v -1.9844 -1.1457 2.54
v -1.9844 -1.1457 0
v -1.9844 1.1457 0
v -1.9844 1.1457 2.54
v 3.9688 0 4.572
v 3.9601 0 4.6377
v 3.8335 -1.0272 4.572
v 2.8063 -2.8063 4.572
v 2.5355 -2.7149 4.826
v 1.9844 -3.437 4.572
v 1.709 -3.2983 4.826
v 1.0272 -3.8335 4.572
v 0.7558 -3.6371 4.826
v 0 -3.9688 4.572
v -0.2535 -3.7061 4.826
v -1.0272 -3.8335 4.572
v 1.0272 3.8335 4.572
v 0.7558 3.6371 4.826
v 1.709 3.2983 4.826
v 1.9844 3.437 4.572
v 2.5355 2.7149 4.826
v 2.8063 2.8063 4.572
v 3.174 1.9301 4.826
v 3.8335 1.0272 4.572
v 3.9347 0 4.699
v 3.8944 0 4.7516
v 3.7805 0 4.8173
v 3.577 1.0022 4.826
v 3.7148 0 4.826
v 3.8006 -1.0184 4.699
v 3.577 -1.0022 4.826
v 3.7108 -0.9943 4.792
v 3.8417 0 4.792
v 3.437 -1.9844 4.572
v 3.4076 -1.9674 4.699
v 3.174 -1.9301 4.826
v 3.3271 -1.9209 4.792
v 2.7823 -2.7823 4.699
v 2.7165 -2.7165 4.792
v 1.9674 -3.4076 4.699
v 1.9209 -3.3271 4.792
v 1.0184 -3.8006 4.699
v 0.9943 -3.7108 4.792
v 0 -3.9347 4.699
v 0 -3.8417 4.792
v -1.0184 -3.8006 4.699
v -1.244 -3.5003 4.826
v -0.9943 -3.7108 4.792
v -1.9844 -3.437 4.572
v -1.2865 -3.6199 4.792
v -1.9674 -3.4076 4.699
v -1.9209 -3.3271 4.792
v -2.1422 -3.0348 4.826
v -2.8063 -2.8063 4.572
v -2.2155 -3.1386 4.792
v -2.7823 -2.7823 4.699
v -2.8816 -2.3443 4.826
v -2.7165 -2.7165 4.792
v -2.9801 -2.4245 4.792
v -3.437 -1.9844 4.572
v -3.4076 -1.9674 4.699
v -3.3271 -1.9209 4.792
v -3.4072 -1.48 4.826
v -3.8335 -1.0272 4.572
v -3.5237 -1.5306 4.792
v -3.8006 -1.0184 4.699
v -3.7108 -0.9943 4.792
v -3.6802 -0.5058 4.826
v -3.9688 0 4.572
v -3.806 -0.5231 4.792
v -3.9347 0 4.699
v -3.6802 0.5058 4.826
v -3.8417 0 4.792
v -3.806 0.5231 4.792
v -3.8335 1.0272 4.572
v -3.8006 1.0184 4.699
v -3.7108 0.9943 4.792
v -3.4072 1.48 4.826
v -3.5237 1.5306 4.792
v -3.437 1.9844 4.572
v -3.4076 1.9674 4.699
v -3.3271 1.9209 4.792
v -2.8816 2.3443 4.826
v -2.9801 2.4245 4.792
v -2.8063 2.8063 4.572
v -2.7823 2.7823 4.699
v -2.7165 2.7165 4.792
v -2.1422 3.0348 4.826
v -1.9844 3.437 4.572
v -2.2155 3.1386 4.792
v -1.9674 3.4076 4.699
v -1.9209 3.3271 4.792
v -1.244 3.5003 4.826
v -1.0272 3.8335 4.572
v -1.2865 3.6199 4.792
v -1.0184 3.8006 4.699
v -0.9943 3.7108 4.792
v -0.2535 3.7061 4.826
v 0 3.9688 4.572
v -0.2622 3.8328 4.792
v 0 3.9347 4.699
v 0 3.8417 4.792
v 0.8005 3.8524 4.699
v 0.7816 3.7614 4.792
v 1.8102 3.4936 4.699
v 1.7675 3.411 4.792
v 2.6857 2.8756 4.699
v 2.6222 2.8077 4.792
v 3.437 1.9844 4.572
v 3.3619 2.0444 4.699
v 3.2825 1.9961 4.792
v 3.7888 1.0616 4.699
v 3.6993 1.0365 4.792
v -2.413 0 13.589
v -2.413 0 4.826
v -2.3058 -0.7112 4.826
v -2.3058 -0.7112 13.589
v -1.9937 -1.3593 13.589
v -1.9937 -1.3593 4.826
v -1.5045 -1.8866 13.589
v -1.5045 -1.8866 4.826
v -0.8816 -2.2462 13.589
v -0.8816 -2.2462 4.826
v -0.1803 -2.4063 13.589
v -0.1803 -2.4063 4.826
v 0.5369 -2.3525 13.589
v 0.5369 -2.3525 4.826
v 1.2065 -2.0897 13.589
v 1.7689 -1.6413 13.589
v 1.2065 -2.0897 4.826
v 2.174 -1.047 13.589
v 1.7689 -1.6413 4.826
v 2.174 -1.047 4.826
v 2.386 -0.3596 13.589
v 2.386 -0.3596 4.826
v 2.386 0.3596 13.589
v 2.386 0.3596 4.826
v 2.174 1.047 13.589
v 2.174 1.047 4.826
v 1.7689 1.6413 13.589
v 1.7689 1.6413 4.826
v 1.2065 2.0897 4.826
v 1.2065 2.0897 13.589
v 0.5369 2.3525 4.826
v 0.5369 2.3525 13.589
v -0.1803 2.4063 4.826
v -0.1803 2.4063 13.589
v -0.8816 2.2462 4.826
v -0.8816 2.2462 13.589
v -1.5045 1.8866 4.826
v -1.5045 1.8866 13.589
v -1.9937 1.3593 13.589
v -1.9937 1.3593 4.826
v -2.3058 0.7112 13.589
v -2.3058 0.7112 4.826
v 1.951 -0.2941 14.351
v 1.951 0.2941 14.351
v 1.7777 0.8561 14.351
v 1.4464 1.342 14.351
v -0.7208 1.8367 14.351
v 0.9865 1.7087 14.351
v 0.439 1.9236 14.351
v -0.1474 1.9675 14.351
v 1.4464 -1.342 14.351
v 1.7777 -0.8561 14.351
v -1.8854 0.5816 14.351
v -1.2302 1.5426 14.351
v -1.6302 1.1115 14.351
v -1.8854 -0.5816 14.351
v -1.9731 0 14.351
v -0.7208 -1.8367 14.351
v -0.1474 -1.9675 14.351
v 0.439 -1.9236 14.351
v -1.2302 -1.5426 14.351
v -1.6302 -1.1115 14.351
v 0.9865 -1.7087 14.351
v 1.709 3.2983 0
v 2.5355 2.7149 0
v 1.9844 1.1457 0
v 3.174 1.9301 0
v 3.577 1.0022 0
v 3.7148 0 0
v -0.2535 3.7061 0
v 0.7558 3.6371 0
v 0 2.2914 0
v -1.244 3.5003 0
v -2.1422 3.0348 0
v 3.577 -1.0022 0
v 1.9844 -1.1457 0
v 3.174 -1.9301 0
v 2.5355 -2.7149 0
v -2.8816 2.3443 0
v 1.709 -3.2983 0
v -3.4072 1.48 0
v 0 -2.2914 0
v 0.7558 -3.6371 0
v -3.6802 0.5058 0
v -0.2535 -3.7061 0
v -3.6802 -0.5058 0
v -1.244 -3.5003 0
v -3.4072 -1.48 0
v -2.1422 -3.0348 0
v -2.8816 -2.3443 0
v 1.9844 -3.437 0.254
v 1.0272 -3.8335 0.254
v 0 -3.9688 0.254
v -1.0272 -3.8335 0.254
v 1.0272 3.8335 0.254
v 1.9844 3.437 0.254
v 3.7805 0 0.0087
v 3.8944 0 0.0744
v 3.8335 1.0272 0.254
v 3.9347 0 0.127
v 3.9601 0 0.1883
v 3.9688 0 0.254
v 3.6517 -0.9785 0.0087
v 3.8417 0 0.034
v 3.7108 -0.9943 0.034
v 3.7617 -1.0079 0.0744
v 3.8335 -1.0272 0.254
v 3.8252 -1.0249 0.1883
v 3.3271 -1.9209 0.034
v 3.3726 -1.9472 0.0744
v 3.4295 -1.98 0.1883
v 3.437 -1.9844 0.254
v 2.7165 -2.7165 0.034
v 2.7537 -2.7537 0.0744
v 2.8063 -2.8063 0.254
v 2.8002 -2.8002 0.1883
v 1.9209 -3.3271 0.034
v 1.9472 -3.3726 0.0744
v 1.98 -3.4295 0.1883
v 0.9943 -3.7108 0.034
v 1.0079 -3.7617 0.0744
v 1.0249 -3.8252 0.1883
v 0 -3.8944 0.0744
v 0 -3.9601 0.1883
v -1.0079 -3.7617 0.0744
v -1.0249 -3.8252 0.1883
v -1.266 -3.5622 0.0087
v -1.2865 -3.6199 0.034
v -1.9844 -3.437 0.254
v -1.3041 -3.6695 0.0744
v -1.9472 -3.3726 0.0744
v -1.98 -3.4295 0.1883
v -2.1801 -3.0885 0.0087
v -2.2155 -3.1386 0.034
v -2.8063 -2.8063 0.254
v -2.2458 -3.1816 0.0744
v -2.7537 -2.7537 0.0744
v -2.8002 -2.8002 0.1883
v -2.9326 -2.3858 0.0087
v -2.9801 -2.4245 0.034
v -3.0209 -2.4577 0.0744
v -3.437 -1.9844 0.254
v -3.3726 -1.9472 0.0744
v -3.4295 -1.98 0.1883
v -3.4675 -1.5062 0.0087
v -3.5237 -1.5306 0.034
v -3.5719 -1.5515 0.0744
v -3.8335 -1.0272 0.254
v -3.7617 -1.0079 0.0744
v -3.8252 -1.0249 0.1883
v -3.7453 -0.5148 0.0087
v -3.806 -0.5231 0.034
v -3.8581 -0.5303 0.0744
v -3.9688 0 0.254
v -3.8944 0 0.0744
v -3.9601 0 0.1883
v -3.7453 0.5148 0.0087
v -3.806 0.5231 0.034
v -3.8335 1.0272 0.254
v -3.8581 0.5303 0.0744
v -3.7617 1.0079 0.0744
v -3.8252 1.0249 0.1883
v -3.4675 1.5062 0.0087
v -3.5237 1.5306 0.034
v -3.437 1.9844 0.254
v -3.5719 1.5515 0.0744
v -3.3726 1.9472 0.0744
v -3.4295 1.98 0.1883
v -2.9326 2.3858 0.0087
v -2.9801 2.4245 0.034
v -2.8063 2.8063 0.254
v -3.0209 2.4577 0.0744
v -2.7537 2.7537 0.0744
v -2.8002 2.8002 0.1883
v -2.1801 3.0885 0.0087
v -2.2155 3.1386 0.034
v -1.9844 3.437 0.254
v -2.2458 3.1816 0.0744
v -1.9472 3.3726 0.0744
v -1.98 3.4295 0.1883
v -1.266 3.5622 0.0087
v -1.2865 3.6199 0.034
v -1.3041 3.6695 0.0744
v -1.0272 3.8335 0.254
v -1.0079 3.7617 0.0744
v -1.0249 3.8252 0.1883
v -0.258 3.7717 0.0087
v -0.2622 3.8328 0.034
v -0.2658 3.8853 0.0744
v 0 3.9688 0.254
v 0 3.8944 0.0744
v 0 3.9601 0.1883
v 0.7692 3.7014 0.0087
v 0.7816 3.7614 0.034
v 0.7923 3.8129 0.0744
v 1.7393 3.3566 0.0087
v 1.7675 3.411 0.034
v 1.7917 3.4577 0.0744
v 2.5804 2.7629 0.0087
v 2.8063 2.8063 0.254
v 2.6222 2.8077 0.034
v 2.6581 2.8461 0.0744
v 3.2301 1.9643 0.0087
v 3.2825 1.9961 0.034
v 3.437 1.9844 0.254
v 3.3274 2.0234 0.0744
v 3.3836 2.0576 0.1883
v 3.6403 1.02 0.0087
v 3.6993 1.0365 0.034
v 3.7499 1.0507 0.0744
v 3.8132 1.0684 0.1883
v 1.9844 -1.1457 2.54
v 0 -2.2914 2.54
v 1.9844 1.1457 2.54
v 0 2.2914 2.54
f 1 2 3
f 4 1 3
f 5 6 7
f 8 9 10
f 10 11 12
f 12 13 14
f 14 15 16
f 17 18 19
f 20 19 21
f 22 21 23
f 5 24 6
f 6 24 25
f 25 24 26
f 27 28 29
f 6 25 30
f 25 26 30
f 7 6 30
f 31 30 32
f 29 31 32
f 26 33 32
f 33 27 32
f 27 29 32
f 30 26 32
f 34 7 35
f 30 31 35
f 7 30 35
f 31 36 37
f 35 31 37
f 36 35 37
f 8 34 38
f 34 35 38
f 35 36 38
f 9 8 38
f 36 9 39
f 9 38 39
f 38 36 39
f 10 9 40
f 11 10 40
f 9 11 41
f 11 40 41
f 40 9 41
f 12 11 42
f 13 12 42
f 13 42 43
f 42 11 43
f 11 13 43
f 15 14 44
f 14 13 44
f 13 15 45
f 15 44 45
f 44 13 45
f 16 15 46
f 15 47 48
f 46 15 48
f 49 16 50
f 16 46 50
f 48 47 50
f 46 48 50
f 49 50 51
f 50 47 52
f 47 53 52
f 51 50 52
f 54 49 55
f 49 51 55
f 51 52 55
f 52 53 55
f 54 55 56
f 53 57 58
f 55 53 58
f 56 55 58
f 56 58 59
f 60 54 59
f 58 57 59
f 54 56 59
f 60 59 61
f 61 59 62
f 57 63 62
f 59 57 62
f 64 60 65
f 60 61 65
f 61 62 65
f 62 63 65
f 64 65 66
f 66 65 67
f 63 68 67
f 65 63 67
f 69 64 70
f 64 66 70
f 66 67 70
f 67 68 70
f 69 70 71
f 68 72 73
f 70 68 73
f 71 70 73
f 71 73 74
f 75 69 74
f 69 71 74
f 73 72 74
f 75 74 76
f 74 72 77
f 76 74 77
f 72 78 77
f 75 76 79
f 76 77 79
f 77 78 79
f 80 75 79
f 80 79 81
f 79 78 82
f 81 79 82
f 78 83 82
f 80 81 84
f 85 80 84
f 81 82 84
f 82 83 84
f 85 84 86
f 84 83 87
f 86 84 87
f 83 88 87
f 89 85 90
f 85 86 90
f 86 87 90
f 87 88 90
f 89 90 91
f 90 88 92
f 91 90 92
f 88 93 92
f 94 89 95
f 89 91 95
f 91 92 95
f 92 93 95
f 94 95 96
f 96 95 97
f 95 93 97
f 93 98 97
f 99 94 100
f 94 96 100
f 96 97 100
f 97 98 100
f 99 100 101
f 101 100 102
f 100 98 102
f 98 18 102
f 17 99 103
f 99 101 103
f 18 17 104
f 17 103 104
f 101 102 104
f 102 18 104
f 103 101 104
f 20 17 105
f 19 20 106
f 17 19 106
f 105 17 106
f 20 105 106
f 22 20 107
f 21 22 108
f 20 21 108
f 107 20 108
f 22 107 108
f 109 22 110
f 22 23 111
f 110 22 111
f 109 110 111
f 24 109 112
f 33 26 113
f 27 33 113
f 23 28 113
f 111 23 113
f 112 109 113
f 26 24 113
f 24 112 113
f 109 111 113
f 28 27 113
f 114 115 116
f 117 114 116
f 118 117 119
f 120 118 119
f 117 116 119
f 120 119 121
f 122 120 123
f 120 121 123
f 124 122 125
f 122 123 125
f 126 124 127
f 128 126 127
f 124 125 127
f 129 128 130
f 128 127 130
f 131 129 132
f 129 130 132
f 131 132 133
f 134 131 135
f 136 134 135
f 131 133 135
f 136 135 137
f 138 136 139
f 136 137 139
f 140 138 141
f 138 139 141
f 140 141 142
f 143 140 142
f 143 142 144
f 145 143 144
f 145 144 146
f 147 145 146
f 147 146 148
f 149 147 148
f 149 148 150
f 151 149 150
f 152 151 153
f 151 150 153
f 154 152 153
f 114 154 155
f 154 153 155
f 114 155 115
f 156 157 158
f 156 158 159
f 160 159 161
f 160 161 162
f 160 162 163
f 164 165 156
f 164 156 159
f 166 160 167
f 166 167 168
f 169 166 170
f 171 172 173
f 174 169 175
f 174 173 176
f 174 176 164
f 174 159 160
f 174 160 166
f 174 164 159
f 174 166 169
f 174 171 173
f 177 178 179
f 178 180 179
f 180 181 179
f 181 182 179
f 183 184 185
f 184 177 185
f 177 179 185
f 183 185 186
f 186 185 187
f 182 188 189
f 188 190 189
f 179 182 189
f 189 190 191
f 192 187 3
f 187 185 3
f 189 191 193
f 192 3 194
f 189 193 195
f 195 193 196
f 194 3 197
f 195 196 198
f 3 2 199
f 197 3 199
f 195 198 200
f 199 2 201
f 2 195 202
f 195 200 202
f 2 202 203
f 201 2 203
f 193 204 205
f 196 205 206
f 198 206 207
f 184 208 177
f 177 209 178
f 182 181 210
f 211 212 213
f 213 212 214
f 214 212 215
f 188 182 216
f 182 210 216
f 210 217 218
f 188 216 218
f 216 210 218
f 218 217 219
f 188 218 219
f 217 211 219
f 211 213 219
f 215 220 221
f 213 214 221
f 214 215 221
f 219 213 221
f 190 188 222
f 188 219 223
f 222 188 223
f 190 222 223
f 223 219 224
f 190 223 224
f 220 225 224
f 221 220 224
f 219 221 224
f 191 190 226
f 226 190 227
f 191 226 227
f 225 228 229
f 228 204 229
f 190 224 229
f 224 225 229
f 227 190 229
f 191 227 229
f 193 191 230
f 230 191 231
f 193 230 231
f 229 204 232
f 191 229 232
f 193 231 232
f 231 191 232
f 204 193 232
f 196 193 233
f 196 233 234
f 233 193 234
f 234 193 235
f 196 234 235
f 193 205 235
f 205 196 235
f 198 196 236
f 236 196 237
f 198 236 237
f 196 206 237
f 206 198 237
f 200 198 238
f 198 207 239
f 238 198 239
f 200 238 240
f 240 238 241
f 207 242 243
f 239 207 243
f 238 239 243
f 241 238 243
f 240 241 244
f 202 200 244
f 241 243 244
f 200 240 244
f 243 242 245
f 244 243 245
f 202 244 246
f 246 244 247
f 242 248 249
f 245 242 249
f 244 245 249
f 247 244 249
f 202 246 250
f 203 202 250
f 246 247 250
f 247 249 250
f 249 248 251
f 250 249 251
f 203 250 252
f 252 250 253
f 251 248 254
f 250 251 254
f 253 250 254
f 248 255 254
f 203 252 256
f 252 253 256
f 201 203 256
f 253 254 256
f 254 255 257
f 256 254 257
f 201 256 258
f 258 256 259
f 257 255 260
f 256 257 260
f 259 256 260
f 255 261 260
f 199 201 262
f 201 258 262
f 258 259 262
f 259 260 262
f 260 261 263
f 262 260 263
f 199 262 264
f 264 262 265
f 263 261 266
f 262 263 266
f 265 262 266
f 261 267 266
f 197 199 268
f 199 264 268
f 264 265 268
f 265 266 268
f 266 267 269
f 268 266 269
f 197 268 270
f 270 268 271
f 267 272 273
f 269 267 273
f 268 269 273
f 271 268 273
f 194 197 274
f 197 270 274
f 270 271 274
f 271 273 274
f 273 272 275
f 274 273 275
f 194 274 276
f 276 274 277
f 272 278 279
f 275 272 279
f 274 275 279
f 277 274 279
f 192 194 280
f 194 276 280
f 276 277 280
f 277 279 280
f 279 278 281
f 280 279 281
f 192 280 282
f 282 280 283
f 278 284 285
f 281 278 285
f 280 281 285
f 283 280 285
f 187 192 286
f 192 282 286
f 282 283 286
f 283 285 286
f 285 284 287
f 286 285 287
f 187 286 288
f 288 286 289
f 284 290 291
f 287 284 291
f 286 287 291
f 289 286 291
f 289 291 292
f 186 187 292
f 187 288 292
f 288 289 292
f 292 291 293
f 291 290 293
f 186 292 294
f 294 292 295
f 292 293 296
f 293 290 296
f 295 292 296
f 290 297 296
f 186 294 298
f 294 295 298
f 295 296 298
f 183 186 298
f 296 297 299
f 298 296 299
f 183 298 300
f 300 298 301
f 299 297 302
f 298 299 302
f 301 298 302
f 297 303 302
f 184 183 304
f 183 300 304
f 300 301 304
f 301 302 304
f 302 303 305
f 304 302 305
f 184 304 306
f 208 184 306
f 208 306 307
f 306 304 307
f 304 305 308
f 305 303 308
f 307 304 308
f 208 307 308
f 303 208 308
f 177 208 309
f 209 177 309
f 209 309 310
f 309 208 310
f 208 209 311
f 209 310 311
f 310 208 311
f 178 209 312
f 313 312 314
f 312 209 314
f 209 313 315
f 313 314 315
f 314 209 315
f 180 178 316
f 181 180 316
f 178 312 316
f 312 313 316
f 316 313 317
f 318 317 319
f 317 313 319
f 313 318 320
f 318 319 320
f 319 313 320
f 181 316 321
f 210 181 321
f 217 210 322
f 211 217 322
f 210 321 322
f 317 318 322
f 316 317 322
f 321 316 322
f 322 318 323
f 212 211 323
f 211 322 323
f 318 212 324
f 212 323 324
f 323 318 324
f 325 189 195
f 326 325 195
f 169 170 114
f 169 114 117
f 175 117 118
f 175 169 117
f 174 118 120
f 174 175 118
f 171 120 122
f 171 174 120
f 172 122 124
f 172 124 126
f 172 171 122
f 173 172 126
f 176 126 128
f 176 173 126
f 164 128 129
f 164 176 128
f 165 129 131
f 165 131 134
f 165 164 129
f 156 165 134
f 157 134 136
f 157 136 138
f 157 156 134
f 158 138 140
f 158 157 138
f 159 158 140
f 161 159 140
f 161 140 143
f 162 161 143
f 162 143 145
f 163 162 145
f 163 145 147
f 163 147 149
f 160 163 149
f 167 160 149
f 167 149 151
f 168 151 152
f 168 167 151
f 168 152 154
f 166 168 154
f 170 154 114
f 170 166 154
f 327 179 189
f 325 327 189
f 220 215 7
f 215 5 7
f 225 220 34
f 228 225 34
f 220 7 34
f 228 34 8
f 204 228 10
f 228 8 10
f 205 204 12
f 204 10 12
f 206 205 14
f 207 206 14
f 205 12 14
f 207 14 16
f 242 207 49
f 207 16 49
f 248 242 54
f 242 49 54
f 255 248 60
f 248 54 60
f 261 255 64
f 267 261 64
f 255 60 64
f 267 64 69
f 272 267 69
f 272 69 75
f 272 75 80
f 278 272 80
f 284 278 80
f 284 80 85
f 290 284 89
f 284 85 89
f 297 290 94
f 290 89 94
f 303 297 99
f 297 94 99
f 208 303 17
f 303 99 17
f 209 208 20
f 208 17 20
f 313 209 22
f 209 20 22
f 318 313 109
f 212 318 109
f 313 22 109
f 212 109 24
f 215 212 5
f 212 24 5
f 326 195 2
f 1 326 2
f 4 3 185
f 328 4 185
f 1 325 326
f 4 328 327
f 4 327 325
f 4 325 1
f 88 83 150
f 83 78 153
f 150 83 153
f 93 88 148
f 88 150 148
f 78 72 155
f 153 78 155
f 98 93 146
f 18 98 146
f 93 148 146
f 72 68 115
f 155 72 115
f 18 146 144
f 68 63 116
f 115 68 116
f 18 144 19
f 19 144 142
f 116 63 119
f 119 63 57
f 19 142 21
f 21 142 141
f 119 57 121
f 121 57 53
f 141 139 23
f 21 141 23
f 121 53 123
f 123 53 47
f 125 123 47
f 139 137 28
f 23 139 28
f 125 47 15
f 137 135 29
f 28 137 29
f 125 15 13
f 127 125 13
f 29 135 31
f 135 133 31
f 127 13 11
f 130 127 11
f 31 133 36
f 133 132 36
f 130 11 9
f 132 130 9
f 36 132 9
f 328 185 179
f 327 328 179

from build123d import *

# Parameters (mm, degrees)
CUT_EXTRUDE1_DEPTH  = 2.54
SKETCH3_R           = 2.413
BOSS_EXTRUDE1_DEPTH = 9.525
CHAMFER1_SIZE       = 0.762
CHAMFER1_SIZE2      = 0.439940905


with BuildPart() as part:
    # Sketch1 → Revolve1 (revolve)
    with BuildSketch(Plane(origin=(0, 0, 0), x_dir=(1, 0, 0), z_dir=(0, 1, 0))):
        with BuildLine():
            Line((0, 0), (3.71475, 0))
            ThreePointArc((3.71475, 0), (3.894355122, -0.074394878), (3.96875, -0.254))
            Line((3.96875, -0.254), (3.96875, -4.572))
            ThreePointArc((3.96875, -4.572), (3.894355122, -4.751605122), (3.71475, -4.826))
            Line((3.71475, -4.826), (0, -4.826))
            Line((0, -4.826), (0, 0))
        make_face()
    revolve(axis=Axis((0, 0, 0), (0, 0, -1)))

    # Sketch2 → Cut-Extrude1 (cut)
    with BuildSketch(Plane(origin=(0, 0, 0), x_dir=(-1, 0, 0), z_dir=(0, 0, -1))):
        Polygon((0, 2.291358881), (-1.984375, 1.14567944), (-1.984375, -1.14567944), (0, -2.291358881), (1.984375, -1.14567944), (1.984375, 1.14567944), align=None)
    extrude(amount=-CUT_EXTRUDE1_DEPTH, mode=Mode.SUBTRACT)

    # Sketch3 → Boss-Extrude1 (add)
    with BuildSketch(Plane.XY.offset(4.826)):
        with Locations(Location((0, 0, 0), (0, 0, 180))):
            Circle(SKETCH3_R)
    extrude(amount=BOSS_EXTRUDE1_DEPTH)

    # Chamfer1
    chamfer1_edges = [part.edges().sort_by_distance(p)[0] for p in [
        (2.413, 0, 14.351),
    ]]
    chamfer1_side = [part.faces().sort_by_distance(p)[0] for p in [
        (2.413, 0, 9.5885),
    ]]
    chamfer(chamfer1_edges, length=CHAMFER1_SIZE, length2=CHAMFER1_SIZE2, reference=chamfer1_side[0])


solid = part.part
